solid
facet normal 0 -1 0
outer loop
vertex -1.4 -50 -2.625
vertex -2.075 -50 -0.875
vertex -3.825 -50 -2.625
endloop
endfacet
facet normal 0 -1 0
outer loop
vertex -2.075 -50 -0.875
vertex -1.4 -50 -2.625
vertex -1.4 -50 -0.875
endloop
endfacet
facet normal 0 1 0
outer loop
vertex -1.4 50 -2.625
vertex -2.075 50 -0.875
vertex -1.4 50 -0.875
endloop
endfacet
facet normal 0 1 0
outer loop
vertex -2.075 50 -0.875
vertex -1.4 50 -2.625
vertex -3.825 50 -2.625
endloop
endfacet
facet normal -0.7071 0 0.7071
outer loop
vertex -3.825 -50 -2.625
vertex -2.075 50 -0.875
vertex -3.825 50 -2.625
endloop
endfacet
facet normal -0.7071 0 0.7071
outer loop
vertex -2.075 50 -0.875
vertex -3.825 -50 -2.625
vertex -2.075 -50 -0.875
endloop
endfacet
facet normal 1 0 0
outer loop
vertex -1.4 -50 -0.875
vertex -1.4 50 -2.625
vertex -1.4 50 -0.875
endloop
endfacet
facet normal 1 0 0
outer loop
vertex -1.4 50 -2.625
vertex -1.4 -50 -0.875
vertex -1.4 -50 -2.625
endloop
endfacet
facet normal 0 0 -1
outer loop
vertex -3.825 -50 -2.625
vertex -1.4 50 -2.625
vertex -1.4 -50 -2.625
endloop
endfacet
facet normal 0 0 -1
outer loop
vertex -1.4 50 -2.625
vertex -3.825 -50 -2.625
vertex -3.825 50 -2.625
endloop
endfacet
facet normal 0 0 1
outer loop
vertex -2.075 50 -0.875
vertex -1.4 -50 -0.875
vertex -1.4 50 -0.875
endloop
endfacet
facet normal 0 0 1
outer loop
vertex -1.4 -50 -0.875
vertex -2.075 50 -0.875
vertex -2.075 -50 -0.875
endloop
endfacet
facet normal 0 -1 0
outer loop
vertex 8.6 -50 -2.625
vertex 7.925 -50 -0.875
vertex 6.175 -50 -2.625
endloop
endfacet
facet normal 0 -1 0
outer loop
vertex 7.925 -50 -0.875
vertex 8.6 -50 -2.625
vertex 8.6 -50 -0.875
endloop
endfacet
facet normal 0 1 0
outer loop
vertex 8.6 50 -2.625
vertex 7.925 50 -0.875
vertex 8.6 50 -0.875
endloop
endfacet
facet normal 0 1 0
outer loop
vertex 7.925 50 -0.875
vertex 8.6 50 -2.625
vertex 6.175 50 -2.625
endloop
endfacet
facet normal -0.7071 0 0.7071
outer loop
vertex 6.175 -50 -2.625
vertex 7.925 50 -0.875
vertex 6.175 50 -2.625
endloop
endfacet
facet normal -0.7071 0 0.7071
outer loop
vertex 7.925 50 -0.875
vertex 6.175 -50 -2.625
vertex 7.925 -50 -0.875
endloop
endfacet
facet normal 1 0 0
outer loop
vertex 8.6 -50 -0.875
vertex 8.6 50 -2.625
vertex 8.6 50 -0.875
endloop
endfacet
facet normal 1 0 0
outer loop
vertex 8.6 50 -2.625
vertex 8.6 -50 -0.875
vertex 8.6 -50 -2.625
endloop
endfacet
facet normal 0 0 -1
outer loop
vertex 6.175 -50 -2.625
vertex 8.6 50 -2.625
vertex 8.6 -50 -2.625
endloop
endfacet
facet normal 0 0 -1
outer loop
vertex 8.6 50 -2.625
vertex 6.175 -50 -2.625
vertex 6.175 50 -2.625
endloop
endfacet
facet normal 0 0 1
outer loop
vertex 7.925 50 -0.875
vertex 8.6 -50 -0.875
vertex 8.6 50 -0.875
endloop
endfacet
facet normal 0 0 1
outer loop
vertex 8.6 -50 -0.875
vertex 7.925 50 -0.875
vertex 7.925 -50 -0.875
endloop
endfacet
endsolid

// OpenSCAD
W=64;
W2=100;
H=90;
T=1.5;
B=4;
Q=7;
H1=7;
HR=12;

for(x=[-5,5]) {
    translate([x,0,0])
    rotate([0,180,0])
    lockbar();
}

module lockbar() {
    difference() {
        translate([-H1/2-0.1,0,H1/2+0.2]) {
            scale([H1/2,W2,H1/2])
            rotate([-90,0,0])
            triangle();                    
        }
                
                
        translate([0,0,1.5*H1/4])
        cube_center([200,200,H1/4]);
            
        translate([0,0,0])
        cube_center([200,200,H1/8]);
                
    }
}

module cube_center(dims,r=0) {
    if(r==0) {
        translate([-dims[0]/2, -dims[1]/2, 0])
        cube(dims);
    } else {
        
        minkowski() {
            translate([-dims[0]/2+r, -dims[1]/2+r, 0])
            cube([dims[0]-2*r,dims[1]-2*r,dims[2]]);
            cylinder(r=r,h=0.00001,$fn=32);
        }
    }
}


module triangle() {
    linear_extrude(height = 1, center = true, convexity = 10, twist = 0)
    polygon(points=[[0,0],[1,0],[0,1]]);
}
